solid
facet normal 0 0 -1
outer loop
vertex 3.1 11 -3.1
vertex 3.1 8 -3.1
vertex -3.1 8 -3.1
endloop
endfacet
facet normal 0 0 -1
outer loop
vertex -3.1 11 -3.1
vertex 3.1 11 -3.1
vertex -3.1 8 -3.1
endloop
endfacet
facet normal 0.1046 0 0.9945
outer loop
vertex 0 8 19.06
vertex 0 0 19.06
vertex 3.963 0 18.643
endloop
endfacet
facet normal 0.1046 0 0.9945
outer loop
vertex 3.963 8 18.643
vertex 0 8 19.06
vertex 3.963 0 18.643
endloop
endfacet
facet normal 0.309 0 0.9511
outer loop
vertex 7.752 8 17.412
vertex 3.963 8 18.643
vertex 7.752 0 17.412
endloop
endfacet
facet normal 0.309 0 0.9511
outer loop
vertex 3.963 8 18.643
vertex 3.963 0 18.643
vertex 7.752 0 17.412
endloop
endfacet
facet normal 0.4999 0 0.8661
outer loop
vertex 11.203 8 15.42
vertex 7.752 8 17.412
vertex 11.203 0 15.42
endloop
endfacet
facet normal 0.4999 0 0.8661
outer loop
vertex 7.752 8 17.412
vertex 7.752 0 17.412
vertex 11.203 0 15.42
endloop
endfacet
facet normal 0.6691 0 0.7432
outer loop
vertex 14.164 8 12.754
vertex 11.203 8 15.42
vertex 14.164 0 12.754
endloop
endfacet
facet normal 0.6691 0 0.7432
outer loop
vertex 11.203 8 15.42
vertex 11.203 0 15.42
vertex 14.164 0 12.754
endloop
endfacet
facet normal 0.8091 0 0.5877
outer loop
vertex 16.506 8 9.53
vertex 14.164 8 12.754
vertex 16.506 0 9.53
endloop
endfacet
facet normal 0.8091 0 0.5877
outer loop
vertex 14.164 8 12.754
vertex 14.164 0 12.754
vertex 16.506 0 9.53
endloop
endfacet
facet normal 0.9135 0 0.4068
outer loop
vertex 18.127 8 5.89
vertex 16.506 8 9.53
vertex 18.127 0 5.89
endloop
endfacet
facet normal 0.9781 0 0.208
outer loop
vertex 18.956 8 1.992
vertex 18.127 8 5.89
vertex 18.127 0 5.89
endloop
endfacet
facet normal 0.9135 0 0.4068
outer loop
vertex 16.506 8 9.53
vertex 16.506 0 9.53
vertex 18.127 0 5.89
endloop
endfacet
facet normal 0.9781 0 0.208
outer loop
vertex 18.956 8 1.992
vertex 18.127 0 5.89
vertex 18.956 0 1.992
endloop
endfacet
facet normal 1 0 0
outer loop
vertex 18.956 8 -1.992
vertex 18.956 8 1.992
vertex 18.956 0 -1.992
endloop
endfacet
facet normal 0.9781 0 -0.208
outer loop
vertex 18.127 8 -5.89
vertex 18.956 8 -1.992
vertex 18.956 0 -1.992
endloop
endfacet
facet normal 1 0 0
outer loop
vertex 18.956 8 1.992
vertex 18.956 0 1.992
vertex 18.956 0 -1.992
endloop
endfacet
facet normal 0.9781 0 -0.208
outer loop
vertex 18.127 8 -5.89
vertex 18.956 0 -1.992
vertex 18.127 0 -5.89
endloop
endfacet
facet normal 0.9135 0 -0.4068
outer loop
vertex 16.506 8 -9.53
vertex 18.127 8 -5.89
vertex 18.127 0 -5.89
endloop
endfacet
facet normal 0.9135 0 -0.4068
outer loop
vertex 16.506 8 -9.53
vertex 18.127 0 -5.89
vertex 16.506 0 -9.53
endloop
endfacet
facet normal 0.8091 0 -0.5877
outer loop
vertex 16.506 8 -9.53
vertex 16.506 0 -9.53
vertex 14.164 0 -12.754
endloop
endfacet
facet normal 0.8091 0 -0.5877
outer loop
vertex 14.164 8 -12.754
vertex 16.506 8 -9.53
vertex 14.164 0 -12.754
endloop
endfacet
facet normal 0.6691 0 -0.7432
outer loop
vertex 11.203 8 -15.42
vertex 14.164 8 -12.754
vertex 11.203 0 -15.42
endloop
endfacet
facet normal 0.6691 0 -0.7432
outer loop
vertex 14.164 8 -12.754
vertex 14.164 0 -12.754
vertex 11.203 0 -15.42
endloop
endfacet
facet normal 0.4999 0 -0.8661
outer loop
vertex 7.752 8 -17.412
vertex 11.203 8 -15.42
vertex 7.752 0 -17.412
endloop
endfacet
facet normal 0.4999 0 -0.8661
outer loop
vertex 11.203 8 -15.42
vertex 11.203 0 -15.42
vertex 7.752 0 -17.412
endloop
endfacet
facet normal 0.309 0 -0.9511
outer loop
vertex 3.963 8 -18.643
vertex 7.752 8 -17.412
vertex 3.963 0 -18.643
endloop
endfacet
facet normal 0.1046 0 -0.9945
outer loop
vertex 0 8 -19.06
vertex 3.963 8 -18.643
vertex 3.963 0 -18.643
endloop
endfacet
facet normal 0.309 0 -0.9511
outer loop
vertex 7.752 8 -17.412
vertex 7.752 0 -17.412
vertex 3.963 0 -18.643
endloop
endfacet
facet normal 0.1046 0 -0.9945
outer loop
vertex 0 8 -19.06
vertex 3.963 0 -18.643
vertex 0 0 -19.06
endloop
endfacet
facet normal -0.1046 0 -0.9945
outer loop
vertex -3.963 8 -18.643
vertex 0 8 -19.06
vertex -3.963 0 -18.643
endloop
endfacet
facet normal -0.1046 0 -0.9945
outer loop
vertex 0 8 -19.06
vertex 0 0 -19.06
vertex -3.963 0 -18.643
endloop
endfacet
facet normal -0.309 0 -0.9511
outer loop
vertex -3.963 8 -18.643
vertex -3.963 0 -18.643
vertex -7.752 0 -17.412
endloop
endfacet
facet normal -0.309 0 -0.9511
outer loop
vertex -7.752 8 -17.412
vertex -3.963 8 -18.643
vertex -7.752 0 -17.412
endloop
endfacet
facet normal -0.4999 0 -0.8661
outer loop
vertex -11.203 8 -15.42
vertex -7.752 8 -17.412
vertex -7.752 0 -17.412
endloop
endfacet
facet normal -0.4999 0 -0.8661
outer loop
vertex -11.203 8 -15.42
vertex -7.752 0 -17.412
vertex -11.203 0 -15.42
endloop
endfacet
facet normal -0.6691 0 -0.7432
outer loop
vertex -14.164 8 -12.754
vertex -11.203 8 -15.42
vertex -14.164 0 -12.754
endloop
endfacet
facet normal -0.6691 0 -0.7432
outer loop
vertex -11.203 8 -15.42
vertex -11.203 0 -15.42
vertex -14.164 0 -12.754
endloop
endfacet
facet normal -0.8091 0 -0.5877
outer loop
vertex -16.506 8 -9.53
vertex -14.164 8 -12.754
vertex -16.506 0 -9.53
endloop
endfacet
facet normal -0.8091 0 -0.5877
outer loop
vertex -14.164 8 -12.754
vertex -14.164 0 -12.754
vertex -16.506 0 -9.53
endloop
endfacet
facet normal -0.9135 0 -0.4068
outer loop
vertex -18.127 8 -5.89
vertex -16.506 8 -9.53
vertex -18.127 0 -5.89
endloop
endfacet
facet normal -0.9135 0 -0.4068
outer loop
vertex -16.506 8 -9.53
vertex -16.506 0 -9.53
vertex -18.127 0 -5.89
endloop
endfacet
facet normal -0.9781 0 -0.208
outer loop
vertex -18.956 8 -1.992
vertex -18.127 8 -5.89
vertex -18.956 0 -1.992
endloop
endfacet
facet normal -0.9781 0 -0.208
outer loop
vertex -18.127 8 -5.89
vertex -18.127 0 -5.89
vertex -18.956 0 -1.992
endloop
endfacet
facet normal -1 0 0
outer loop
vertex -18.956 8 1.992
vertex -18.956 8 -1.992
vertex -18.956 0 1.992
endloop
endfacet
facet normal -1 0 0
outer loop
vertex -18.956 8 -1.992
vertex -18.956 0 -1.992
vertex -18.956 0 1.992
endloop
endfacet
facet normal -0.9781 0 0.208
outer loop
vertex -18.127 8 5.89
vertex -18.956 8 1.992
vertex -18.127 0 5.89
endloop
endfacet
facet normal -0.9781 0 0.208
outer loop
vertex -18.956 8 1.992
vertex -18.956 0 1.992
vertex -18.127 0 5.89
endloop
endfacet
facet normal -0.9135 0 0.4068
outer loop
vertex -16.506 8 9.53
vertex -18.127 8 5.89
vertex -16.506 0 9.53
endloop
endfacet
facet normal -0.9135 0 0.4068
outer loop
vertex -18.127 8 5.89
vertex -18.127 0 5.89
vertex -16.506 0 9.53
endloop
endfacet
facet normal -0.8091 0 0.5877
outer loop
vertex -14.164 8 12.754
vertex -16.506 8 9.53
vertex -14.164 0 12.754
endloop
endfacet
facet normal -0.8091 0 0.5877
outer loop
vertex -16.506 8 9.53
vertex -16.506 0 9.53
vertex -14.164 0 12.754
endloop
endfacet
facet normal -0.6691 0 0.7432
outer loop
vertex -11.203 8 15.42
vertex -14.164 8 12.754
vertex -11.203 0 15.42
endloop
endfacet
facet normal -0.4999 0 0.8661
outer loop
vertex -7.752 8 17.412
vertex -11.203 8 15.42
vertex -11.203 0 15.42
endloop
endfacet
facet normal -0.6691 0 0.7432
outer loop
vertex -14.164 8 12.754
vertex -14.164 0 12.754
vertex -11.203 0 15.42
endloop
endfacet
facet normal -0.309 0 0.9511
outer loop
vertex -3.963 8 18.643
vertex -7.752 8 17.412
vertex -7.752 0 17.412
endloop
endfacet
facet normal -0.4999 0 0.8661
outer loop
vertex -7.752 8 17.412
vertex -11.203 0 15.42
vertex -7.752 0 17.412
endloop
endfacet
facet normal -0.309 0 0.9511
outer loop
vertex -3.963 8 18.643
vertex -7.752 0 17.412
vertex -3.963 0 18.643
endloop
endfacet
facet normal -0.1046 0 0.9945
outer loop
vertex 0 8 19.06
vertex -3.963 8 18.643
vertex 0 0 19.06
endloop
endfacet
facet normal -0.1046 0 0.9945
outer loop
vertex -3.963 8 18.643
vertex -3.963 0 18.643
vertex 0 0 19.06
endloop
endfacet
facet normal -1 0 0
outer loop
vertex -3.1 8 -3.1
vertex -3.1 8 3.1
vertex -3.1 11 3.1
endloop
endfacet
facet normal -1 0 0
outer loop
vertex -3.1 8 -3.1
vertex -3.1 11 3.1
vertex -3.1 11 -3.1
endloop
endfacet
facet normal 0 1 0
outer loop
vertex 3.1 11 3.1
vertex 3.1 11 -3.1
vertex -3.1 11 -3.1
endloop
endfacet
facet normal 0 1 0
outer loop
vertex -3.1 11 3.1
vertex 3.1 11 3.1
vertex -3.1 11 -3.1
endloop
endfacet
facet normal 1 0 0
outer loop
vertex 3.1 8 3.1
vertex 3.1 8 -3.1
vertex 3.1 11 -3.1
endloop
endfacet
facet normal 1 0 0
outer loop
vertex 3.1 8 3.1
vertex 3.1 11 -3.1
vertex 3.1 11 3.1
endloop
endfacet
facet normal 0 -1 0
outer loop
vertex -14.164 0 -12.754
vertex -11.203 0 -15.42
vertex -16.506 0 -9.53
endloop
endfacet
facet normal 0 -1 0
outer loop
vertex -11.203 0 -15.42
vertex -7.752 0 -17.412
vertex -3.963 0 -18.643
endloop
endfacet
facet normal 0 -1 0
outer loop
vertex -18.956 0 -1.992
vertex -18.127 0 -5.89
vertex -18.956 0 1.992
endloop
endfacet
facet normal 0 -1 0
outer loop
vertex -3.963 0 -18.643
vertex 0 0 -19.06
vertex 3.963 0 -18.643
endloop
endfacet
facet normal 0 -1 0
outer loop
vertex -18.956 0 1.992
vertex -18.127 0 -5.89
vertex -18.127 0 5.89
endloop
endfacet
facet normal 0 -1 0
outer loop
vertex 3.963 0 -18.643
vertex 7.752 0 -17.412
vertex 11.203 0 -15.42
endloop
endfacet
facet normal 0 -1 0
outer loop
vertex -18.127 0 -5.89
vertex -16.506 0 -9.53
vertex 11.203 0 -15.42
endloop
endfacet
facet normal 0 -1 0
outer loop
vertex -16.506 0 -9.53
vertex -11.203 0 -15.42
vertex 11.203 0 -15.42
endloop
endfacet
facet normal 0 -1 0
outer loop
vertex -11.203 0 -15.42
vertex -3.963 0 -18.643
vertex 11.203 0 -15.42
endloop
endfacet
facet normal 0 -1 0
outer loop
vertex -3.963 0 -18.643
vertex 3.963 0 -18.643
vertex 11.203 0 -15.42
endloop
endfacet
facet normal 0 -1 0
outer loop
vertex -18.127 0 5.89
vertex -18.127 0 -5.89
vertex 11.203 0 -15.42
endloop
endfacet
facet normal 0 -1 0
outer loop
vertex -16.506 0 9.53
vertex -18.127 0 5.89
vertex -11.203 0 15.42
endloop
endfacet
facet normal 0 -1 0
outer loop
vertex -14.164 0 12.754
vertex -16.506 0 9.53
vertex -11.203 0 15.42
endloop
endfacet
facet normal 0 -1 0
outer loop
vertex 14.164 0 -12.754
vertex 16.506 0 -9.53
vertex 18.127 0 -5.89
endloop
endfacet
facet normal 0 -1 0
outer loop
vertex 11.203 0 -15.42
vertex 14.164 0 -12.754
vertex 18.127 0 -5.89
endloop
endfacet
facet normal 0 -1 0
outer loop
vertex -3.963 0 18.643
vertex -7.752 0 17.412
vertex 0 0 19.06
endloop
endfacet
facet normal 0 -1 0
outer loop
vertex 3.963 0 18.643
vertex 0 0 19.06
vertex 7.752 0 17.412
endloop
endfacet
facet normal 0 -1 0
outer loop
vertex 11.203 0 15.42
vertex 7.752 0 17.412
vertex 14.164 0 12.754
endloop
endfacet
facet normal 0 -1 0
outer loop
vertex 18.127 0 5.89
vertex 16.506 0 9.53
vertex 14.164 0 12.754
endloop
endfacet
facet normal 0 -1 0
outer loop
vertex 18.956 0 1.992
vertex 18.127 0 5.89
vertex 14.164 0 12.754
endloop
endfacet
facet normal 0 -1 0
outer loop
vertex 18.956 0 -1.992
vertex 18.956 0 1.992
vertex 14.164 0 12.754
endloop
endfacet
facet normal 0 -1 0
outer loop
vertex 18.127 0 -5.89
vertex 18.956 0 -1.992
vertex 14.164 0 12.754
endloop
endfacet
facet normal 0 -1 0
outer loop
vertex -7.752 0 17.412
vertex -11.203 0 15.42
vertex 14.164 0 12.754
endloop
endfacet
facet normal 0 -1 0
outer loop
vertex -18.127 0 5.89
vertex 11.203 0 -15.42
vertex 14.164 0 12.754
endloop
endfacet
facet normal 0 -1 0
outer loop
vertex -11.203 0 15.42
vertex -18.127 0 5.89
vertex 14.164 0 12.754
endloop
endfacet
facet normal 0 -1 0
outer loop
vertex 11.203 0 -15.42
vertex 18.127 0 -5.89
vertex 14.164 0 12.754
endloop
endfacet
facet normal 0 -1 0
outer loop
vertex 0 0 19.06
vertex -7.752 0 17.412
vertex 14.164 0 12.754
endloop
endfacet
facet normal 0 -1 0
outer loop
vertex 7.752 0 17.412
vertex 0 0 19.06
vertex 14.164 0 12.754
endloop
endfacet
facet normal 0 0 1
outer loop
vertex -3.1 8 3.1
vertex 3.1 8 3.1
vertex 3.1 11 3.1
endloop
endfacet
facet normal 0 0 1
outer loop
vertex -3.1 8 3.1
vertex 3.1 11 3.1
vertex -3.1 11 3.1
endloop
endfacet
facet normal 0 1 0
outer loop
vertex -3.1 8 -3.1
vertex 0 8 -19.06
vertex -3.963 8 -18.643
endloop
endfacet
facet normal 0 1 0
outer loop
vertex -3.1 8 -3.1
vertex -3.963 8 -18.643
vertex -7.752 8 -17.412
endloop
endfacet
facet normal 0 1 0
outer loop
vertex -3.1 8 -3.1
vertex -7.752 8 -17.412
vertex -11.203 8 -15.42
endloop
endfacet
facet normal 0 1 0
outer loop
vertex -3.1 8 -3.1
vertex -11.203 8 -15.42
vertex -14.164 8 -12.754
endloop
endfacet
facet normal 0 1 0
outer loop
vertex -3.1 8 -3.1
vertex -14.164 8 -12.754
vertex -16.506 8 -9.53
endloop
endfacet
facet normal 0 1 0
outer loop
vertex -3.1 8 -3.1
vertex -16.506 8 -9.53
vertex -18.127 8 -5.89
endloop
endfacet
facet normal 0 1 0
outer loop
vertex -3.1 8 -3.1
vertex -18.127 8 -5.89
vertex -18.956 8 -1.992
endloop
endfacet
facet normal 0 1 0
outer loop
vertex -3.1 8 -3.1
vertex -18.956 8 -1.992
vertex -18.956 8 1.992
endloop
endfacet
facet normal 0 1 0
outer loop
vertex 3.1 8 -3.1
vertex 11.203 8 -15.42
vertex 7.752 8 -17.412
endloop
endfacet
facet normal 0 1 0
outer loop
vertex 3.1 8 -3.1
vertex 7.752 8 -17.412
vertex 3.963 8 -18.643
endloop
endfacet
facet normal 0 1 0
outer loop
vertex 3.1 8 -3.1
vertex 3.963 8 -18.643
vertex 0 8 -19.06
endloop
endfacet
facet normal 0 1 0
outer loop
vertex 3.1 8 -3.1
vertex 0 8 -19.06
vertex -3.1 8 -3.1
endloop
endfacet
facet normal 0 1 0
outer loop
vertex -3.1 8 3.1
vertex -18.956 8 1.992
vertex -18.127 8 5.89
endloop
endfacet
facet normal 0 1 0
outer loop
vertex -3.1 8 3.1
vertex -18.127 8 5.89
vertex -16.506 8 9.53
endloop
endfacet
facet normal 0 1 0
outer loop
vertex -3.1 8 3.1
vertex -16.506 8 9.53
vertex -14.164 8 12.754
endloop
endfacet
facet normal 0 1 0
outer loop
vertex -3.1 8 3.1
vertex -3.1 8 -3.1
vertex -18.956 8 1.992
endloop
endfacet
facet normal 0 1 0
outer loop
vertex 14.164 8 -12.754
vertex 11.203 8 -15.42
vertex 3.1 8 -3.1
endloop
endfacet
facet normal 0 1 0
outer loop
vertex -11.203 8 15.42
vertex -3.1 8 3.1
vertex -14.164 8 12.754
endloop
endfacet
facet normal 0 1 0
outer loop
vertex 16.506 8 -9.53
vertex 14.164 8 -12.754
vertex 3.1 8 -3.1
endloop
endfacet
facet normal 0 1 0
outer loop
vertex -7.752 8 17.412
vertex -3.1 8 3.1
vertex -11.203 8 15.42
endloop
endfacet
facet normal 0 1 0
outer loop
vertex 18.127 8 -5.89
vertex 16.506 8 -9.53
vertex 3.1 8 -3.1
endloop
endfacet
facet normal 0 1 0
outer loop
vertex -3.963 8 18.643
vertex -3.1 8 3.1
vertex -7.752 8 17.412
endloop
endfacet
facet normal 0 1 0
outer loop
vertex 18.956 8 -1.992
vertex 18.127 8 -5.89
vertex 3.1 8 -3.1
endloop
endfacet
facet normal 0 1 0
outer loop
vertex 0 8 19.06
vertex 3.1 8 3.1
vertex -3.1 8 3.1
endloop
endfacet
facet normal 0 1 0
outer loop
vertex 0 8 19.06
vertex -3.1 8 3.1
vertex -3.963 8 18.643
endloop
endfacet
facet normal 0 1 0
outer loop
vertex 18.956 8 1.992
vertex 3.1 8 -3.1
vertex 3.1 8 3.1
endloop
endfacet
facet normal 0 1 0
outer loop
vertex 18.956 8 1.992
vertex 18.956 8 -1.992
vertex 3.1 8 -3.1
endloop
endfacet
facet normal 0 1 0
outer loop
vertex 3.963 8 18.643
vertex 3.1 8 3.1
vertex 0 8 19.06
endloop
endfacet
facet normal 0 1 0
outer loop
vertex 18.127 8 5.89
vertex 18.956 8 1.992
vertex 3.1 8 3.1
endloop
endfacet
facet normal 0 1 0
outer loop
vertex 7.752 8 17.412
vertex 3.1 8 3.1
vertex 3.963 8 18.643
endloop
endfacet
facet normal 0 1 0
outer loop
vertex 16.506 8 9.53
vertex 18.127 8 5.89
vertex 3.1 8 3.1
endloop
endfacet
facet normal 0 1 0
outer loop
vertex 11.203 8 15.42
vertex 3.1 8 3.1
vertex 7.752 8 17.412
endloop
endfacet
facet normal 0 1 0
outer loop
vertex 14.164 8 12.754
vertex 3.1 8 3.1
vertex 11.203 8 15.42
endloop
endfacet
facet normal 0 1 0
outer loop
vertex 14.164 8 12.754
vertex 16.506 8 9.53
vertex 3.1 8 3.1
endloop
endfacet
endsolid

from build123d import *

# Parameters (mm, degrees)
ESQUISSE1_R        = 19.06
BOSS_EXTRU_1_DEPTH = 8
BOSS_EXTRU_2_DEPTH = 3


with BuildPart() as part:
    # Esquisse1 → Boss.-Extru.1 (new body)
    with BuildSketch(Plane(origin=(0, 0, 0), x_dir=(1, 0, 0), z_dir=(0, 1, 0))):
        with Locations(Location((0, 0, 0), (0, 0, 270))):
            Circle(ESQUISSE1_R)
    extrude(amount=BOSS_EXTRU_1_DEPTH)

    # Esquisse2 → Boss.-Extru.2 (add)
    with BuildSketch(Plane(origin=(0, 8, 0), x_dir=(1, 0, 0), z_dir=(0, 1, 0))):
        Polygon((0, 3.1), (3.1, 3.1), (3.1, -3.1), (-3.1, -3.1), (-3.1, 3.1), align=None)
    extrude(amount=BOSS_EXTRU_2_DEPTH)


solid = part.part
